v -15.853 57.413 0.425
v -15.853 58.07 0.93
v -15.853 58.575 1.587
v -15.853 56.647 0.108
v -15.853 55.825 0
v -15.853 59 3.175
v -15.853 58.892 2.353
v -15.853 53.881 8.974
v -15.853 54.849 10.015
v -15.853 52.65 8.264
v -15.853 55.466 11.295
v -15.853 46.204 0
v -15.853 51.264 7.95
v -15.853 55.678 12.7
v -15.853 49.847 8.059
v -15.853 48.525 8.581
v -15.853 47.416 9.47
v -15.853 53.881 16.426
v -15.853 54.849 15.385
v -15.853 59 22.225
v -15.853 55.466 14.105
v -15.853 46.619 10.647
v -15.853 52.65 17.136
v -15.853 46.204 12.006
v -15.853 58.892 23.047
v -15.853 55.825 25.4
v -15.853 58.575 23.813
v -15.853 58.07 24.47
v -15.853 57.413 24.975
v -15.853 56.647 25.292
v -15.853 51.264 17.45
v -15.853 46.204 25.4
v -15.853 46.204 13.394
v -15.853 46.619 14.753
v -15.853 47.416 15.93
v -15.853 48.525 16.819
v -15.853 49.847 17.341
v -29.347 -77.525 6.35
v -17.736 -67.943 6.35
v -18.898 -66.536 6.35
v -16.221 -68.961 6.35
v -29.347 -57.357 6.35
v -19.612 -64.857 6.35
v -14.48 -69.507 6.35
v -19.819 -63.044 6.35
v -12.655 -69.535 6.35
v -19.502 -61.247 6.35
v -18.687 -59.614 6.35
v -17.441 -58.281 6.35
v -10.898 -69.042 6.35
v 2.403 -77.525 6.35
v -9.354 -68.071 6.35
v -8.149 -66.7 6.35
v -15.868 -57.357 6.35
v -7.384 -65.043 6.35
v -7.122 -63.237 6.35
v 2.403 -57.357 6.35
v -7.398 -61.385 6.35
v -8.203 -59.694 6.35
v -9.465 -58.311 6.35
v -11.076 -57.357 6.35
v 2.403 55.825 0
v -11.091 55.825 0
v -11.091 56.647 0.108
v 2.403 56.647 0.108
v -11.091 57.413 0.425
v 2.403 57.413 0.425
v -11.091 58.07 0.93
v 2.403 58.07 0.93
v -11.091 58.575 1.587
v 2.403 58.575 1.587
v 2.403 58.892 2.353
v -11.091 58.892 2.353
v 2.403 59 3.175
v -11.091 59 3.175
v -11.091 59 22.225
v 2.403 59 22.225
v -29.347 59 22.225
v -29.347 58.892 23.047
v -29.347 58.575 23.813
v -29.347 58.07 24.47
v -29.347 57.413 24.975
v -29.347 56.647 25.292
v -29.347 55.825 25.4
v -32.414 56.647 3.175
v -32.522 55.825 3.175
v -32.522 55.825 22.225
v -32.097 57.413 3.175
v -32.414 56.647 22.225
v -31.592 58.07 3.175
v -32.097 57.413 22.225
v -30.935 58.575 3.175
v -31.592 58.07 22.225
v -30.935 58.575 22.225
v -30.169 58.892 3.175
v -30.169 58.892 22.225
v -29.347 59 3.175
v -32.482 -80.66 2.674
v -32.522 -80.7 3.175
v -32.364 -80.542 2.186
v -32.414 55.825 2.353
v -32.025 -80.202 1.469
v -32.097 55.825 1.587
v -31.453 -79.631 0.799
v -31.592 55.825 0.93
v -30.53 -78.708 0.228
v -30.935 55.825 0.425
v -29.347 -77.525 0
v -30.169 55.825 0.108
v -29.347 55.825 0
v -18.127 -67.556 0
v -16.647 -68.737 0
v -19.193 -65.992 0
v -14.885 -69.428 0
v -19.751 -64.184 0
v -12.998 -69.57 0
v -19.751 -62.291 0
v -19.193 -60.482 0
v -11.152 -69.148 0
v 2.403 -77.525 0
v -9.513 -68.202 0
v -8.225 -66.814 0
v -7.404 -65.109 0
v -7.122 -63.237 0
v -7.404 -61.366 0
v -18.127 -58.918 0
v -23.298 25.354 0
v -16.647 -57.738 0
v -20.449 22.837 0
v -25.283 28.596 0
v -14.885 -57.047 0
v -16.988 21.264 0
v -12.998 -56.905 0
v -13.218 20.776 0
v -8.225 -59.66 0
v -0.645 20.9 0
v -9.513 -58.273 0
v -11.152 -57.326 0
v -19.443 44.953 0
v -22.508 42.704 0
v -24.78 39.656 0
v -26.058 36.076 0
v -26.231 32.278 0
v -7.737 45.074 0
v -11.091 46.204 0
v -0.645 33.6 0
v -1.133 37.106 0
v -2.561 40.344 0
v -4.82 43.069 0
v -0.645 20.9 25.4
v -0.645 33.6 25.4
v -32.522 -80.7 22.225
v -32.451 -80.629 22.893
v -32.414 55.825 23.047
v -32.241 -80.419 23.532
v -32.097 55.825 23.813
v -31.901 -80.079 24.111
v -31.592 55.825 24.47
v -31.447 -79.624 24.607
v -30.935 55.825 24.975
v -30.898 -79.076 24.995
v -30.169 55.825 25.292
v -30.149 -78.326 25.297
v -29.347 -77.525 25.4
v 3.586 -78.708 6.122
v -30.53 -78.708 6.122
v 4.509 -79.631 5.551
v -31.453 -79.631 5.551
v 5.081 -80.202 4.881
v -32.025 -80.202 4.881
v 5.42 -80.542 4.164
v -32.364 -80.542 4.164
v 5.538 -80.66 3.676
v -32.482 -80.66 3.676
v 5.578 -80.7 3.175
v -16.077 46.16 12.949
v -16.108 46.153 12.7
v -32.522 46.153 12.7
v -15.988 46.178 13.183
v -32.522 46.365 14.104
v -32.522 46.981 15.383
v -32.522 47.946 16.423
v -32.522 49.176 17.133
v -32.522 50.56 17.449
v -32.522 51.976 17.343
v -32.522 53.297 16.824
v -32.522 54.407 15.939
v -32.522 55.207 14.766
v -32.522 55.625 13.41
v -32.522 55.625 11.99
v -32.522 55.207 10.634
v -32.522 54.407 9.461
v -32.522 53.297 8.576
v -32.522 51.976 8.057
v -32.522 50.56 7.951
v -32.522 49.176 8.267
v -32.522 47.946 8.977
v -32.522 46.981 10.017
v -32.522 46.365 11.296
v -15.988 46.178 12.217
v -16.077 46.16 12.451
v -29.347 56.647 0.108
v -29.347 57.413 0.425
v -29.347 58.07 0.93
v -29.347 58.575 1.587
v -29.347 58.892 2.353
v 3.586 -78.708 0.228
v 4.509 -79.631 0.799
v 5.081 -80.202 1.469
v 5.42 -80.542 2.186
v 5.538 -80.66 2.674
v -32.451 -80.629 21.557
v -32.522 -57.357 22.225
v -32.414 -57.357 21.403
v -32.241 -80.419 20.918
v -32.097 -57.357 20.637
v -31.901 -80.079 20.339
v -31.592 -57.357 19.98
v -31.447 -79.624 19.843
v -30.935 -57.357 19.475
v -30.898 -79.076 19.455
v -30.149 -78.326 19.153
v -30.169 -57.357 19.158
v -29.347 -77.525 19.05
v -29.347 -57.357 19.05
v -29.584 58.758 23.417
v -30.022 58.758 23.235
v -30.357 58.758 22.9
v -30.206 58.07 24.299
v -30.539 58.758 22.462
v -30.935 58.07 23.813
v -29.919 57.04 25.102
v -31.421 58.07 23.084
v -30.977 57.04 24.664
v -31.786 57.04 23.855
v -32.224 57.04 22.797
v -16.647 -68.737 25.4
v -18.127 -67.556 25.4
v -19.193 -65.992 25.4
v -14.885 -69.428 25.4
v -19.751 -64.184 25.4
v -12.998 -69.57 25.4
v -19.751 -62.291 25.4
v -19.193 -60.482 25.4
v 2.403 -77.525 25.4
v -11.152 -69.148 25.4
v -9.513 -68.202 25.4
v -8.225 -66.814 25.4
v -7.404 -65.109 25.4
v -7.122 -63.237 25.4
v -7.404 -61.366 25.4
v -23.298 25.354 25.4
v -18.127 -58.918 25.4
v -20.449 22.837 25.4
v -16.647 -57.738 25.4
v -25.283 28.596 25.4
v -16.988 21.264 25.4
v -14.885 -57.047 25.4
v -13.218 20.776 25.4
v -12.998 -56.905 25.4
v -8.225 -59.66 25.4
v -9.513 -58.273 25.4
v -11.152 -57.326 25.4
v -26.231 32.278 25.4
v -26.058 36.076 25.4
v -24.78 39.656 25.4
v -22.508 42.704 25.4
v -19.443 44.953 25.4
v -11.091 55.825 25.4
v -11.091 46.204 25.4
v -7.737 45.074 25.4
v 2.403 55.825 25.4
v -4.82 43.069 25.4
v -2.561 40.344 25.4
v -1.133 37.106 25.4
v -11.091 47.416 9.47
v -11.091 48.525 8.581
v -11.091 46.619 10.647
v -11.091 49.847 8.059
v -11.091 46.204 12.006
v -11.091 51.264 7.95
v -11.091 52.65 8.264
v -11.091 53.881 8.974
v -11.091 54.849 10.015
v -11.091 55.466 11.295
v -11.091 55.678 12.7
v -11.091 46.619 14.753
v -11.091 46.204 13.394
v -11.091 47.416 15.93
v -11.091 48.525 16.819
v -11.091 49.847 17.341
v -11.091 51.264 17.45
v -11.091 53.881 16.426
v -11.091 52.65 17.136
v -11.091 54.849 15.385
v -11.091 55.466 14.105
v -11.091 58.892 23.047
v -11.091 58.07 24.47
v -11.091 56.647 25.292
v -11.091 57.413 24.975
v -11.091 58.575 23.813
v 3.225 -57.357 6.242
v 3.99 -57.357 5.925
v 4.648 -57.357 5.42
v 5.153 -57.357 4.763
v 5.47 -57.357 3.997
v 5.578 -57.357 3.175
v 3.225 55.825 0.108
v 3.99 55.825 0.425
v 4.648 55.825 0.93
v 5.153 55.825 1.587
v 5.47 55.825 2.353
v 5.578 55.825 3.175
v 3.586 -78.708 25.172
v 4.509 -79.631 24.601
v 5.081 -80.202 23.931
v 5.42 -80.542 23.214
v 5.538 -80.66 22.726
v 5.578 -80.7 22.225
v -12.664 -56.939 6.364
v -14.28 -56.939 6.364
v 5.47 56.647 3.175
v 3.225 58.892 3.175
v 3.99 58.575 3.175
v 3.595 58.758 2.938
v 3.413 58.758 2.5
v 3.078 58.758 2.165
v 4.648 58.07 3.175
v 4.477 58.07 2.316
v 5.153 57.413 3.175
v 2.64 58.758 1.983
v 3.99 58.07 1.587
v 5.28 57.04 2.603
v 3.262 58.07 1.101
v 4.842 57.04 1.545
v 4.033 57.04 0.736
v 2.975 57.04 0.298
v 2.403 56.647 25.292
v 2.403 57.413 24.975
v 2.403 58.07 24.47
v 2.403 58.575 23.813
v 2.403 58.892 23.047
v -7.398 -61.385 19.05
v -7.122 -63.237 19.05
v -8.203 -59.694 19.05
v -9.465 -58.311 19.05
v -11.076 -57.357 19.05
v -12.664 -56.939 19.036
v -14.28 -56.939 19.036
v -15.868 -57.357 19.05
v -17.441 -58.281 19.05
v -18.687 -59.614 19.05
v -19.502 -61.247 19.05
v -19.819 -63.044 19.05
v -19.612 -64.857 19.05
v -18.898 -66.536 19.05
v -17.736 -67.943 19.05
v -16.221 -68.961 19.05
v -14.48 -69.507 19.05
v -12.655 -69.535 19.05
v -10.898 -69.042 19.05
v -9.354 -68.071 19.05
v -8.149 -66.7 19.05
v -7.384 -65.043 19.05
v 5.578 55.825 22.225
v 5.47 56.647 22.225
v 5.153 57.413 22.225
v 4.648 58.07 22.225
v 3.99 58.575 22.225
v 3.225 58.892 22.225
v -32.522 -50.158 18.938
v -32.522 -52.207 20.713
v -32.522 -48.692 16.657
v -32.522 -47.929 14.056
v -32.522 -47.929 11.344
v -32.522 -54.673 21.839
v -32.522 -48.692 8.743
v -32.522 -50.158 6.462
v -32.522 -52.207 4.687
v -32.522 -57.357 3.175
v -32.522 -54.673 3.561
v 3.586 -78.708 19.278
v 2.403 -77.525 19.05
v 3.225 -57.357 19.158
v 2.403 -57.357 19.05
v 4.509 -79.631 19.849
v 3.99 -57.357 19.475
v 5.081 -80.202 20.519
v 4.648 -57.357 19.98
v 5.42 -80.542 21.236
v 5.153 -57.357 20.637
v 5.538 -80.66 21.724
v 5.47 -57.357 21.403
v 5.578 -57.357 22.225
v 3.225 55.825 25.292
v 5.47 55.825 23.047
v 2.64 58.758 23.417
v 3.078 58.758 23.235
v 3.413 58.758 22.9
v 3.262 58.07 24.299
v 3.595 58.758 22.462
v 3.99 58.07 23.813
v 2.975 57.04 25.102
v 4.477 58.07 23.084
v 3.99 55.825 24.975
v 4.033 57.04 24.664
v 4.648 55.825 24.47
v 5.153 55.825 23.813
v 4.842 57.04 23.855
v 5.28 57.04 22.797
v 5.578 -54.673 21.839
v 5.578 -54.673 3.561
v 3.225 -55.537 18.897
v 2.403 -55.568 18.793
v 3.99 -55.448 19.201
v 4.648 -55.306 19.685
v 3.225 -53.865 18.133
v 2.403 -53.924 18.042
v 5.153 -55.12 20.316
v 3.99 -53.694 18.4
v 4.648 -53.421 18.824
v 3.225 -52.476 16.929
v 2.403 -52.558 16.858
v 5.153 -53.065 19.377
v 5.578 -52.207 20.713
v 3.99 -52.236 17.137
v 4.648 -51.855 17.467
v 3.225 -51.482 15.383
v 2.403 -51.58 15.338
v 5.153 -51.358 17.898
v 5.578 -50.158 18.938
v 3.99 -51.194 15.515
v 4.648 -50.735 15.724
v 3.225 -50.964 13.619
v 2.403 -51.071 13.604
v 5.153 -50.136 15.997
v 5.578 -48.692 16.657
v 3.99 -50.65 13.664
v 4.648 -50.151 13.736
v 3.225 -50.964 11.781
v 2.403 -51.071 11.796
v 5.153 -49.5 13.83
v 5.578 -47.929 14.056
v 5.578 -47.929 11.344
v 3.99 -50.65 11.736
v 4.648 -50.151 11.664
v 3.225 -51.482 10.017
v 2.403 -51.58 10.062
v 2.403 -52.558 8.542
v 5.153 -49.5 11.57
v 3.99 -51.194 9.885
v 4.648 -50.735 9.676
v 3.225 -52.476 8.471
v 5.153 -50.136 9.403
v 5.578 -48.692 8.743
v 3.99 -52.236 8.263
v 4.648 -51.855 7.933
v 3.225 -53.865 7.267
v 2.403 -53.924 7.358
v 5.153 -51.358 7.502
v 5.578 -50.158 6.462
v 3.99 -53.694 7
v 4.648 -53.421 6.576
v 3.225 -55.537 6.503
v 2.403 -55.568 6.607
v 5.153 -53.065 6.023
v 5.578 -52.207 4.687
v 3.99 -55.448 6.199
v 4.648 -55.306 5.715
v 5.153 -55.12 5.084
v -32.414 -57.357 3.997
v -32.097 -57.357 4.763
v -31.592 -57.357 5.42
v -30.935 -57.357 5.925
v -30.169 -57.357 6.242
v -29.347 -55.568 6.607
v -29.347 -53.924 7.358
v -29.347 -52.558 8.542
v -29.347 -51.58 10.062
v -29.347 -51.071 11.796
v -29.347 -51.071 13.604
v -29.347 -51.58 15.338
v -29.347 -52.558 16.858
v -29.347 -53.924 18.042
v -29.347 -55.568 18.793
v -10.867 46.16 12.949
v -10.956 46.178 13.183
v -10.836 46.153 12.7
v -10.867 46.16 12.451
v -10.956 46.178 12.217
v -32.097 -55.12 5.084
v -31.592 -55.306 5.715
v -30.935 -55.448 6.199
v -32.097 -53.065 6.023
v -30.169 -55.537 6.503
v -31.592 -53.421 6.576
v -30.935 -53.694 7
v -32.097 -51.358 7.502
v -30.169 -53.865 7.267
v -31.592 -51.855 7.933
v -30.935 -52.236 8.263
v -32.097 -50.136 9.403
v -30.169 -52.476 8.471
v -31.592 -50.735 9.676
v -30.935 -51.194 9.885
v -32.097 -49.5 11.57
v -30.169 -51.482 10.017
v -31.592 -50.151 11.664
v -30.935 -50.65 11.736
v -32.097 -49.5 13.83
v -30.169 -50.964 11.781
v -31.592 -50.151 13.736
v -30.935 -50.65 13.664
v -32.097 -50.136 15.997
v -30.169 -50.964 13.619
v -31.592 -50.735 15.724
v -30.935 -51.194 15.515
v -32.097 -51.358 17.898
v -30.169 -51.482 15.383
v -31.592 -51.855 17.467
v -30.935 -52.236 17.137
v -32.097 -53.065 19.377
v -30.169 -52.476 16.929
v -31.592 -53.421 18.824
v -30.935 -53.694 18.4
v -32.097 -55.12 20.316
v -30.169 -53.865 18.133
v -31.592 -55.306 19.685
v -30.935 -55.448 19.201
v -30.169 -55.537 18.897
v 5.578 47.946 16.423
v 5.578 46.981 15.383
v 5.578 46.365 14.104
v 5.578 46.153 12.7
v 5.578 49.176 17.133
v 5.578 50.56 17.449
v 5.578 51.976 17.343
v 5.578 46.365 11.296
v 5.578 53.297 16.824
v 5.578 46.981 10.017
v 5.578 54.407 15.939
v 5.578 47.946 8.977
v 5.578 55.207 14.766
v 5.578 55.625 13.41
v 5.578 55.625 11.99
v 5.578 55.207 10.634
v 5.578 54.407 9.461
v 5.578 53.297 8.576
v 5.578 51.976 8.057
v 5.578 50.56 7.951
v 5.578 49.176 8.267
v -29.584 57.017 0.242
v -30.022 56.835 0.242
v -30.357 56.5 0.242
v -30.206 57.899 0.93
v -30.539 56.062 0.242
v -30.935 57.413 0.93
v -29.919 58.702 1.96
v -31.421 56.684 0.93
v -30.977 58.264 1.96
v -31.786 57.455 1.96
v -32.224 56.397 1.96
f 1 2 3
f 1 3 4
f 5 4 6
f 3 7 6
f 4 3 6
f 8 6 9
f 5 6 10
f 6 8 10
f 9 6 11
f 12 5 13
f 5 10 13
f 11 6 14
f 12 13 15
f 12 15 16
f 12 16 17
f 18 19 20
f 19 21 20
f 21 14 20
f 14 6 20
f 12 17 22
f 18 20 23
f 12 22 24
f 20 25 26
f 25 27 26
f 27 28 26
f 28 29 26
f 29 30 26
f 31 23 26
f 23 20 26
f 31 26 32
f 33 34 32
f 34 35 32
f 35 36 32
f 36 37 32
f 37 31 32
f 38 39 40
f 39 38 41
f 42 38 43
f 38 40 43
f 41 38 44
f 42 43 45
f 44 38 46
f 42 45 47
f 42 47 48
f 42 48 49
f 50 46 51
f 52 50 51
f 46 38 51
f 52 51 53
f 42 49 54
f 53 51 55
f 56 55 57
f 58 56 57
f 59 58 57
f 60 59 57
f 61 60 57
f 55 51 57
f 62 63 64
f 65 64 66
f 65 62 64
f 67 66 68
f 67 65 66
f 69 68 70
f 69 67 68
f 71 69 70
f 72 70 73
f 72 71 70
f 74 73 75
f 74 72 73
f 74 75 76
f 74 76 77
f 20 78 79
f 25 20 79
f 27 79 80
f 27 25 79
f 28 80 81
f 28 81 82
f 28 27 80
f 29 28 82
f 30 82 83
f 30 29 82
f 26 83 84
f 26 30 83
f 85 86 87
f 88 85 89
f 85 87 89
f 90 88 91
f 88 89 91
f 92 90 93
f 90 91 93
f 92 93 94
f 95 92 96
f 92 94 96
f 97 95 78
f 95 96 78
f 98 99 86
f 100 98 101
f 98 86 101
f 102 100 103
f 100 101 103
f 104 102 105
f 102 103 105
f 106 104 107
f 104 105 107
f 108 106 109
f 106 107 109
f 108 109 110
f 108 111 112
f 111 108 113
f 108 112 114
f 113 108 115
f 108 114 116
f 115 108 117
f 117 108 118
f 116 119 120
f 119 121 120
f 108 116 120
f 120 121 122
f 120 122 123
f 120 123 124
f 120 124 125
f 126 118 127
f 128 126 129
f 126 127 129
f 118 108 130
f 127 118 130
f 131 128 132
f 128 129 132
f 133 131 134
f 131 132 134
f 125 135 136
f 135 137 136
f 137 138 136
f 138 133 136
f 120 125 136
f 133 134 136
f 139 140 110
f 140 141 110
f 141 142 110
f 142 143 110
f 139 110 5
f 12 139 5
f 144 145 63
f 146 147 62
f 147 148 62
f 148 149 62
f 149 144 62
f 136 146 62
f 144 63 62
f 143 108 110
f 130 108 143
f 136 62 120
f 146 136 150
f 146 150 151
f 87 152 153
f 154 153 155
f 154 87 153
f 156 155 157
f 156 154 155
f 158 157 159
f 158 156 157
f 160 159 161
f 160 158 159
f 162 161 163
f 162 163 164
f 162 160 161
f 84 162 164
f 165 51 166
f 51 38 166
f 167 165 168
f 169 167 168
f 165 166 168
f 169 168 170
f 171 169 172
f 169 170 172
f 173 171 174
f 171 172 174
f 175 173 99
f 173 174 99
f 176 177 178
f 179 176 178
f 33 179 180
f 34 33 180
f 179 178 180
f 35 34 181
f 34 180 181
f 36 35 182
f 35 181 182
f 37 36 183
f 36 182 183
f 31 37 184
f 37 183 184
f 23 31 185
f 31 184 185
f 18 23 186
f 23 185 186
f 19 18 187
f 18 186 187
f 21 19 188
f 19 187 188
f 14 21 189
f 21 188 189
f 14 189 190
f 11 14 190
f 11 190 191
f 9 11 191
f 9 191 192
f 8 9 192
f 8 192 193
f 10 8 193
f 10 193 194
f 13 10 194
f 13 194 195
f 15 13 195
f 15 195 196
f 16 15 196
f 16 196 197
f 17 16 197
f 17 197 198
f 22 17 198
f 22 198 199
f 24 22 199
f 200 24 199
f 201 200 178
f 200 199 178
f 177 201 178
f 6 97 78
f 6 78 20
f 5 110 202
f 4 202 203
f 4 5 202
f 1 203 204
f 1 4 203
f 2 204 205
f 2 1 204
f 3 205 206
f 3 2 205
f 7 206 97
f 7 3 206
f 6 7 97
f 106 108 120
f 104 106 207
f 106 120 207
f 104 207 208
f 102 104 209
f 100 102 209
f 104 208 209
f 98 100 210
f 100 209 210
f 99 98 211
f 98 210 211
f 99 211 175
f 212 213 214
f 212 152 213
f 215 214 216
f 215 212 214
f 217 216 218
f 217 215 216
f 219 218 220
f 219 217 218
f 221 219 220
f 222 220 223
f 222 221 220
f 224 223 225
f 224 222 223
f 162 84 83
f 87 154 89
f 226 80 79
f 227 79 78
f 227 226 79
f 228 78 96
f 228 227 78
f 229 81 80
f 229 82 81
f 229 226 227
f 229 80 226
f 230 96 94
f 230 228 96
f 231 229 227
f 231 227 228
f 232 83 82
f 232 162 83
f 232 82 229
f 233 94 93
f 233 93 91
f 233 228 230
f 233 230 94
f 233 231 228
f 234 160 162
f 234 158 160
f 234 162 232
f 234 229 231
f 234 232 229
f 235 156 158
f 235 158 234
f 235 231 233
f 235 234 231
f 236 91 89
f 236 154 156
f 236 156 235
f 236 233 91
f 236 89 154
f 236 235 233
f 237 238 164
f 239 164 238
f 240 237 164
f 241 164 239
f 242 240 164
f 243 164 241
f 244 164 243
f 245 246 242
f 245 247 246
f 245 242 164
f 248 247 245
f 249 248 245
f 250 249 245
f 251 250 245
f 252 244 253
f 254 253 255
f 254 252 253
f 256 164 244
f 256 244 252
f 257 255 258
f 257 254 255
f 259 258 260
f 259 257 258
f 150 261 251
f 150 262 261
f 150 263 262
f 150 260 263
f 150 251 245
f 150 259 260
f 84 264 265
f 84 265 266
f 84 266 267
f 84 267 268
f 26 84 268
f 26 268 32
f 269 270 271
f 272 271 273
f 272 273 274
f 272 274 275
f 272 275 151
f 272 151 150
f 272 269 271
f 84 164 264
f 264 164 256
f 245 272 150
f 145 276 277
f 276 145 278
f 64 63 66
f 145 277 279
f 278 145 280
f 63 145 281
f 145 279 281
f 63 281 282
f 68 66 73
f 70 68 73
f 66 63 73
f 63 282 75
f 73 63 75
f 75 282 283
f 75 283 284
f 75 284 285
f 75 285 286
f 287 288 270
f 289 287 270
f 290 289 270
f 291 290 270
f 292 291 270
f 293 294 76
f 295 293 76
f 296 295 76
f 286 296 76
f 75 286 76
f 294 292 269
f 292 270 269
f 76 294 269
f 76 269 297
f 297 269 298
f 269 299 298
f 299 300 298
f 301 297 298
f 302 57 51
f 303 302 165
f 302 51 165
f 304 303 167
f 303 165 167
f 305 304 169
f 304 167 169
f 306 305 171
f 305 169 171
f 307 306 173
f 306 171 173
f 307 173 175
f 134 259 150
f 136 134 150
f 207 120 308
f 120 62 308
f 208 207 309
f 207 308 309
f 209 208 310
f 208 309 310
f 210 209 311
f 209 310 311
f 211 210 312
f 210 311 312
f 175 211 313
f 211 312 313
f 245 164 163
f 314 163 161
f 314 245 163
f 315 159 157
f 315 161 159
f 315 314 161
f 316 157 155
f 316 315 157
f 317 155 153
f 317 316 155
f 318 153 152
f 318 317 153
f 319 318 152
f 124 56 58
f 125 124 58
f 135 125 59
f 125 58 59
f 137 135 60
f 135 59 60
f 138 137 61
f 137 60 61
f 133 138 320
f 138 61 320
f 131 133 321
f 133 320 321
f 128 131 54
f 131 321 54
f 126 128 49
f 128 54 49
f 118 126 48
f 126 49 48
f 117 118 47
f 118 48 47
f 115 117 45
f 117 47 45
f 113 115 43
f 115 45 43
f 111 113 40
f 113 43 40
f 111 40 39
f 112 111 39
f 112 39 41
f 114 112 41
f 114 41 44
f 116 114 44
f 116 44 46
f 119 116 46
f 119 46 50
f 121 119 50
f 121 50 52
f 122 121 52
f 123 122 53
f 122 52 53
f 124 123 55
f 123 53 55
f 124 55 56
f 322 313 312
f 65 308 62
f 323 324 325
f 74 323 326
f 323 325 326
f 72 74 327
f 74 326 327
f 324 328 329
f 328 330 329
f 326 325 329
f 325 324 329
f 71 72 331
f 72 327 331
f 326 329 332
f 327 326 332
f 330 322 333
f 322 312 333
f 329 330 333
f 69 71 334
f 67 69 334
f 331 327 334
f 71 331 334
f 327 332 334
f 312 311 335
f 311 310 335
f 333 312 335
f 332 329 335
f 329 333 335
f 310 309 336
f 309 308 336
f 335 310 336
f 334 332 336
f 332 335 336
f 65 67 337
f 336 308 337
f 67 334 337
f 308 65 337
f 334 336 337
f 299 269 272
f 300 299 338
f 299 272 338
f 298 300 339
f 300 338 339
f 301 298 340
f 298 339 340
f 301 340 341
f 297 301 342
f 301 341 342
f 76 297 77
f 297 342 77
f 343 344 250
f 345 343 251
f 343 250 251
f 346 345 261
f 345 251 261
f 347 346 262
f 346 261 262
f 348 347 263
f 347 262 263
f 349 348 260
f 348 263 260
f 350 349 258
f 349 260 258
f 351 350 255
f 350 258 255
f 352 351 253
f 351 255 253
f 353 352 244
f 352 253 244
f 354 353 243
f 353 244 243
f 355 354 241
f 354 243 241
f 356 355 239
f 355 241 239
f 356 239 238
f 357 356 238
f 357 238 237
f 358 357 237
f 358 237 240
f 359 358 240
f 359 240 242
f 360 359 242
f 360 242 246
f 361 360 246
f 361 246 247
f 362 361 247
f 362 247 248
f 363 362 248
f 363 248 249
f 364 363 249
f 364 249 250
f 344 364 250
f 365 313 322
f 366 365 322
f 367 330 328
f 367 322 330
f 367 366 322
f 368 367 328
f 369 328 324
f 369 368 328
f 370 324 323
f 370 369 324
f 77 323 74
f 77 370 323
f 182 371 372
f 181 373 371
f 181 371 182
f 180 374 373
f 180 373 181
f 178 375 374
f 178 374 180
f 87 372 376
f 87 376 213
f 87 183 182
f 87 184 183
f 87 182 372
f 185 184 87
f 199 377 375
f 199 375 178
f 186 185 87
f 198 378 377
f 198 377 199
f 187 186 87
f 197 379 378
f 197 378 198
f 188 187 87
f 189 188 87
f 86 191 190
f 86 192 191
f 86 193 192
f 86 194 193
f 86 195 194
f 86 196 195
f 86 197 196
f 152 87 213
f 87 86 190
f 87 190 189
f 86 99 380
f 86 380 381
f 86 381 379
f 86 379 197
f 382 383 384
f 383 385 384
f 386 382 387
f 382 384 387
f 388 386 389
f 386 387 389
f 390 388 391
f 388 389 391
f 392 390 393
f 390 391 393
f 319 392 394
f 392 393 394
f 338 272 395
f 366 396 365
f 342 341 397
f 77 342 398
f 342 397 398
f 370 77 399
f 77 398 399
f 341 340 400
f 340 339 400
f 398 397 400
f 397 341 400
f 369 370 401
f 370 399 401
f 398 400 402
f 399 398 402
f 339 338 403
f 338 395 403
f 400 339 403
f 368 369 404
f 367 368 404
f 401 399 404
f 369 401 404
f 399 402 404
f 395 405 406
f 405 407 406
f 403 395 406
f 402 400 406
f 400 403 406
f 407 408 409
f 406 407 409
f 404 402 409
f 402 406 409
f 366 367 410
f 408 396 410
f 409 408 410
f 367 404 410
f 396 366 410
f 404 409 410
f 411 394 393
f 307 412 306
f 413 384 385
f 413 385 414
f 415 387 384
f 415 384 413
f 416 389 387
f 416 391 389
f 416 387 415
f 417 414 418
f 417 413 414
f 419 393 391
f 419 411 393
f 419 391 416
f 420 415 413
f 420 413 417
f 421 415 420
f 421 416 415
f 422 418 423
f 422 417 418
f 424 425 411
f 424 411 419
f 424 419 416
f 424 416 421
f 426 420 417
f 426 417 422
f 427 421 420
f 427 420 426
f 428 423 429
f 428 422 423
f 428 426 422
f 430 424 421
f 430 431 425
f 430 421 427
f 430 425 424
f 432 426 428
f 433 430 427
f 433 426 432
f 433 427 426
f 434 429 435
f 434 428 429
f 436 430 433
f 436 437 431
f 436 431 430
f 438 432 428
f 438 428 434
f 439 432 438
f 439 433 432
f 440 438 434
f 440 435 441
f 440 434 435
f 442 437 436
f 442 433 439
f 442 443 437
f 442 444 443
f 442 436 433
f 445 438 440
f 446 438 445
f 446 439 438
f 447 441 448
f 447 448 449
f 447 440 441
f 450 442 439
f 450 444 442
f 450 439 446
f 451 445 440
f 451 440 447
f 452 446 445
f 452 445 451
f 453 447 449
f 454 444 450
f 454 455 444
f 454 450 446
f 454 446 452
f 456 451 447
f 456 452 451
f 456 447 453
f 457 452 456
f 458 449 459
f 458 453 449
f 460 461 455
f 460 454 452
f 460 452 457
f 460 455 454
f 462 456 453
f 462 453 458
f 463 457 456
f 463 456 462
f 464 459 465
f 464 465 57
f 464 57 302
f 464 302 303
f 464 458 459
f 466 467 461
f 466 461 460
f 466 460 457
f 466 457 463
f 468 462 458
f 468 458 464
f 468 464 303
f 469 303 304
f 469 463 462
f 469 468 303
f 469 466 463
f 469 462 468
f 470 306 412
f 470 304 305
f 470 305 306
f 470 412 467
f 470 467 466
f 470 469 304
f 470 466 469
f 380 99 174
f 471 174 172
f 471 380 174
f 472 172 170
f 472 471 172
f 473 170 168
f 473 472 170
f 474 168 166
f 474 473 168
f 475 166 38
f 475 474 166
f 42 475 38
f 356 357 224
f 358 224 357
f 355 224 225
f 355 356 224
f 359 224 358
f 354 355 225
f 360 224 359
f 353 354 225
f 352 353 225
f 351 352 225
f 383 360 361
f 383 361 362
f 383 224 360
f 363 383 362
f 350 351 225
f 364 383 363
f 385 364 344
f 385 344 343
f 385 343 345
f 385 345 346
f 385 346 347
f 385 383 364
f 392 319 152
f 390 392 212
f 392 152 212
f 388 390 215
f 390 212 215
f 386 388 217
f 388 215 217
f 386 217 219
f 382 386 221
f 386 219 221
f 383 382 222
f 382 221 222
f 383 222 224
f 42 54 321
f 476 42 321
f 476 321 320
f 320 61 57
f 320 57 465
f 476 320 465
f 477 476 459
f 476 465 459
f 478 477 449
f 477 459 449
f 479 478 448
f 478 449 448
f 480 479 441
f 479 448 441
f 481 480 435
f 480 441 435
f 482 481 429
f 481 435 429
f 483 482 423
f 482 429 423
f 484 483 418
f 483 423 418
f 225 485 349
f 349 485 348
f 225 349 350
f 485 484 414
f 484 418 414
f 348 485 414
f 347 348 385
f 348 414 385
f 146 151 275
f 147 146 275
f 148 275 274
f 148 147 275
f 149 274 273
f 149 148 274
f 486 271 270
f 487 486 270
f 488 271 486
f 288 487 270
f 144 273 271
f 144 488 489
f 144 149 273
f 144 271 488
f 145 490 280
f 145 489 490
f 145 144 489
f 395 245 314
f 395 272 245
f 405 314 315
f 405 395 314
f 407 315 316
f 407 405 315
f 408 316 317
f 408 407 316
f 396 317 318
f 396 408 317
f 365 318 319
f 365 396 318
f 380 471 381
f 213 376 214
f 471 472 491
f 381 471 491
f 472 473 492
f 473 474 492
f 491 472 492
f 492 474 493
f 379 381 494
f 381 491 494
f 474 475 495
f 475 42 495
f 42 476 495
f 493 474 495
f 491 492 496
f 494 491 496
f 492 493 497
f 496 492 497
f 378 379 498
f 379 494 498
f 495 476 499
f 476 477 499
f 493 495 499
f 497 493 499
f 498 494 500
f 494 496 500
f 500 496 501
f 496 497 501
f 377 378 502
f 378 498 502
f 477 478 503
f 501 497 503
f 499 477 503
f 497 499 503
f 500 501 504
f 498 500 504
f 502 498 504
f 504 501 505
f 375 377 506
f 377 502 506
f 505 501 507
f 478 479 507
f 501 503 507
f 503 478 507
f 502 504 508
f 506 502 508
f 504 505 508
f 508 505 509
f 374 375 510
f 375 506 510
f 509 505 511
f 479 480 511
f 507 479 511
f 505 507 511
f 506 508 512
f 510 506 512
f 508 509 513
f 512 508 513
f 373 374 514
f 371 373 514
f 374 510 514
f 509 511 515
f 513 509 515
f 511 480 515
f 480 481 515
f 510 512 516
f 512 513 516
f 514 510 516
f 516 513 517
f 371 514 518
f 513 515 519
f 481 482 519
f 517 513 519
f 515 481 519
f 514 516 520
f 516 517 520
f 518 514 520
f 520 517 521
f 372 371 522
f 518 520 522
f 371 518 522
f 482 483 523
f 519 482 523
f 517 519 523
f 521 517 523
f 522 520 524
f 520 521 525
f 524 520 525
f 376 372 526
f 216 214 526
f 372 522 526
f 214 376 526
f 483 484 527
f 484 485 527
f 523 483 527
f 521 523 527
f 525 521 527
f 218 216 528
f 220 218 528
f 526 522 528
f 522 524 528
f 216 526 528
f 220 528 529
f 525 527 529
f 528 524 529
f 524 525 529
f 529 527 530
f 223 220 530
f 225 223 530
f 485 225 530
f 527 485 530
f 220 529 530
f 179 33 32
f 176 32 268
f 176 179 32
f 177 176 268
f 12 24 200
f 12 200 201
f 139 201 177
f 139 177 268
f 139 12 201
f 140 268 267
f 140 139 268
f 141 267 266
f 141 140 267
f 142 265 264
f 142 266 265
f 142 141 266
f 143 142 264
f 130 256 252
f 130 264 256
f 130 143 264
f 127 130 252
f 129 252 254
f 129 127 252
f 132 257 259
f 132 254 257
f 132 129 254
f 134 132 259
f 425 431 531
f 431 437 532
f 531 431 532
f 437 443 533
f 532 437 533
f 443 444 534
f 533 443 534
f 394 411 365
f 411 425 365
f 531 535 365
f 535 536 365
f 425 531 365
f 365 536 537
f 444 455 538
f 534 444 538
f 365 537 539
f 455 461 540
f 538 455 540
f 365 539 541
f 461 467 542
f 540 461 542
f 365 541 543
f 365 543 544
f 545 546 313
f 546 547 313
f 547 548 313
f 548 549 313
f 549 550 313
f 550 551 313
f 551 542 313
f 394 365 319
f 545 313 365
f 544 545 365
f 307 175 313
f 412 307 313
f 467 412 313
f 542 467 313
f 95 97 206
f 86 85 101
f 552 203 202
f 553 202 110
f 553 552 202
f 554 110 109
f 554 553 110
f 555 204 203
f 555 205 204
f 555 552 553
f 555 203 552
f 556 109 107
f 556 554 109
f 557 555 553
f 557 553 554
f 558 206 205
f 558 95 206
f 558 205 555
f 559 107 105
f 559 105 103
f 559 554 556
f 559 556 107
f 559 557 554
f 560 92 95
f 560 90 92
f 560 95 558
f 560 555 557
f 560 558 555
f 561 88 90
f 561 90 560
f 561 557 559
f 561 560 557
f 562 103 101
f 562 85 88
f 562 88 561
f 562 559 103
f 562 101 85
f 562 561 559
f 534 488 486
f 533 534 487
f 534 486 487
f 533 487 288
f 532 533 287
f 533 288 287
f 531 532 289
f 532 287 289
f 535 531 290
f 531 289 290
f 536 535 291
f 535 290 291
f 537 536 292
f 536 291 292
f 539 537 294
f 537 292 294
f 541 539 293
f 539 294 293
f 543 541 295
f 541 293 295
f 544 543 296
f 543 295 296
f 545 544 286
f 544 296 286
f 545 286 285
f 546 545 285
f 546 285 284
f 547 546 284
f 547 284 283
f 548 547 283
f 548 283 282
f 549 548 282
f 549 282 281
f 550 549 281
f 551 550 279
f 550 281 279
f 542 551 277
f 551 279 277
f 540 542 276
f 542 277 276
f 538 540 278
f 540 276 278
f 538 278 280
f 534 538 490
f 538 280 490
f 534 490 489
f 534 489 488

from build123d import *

# Parameters (mm, degrees)
F0_W      = 38.1
F0_H      = 139.7
F0_R      = 12.827
F1_DEPTH  = 25.4
F3_DEPTH  = 25.4
F4_R      = 4.7625
F5_DEPTH  = 127
F6_R      = 6.35
F7_DEPTH  = 50.8
F8_W      = 23.3431950331
F8_H      = 12.7
F9_DEPTH  = 76.2
F10_R     = 3.17499
F12_DEPTH = 25.4


# Not quite as in the source:
# - a fillet or chamfer is up to 0.001 mm smaller than in the source, because OpenCascade refuses the exact size


with BuildPart() as f1:
    # F0 (on Top) → F1 (new body)
    with BuildSketch(Plane.XY):
        with Locations((-13.4720488012, -10.8498208284)):
            Rectangle(F0_W, F0_H)
        with Locations((-13.4720488012, 33.6001791716)):
            Circle(F0_R, mode=Mode.SUBTRACT)
    extrude(amount=F1_DEPTH)

    # F2 (on face) → F3 (cut)
    with BuildSketch(Plane.XY.offset(25.4)):
        with BuildLine():
            Line((-11.0907988012, 46.2042093777), (-11.0907988012, 59.0001791716))
            Line((-11.0907988012, 59.0001791716), (-15.8532988012, 59.0001791716))
            Line((-15.8532988012, 59.0001791716), (-15.8532988012, 46.2042093777))
            ThreePointArc((-15.8532988012, 46.2042093777), (-13.4720488012, 46.4271791716), (-11.0907988012, 46.2042093777))
        make_face()
    extrude(amount=-F3_DEPTH, mode=Mode.SUBTRACT)

    # F4 (on face) → F5 (cut)
    with BuildSketch(Plane(origin=(-32.5220488012, 0, 0), x_dir=(0, -1, 0), z_dir=(-1, 0, 0))):
        with Locations((-50.9158676147, 12.7)):
            Circle(F4_R)
    extrude(amount=-F5_DEPTH, mode=Mode.SUBTRACT)

    # F6 (on face) → F7 (cut)
    with BuildSketch(Plane.XY.offset(25.4)):
        with Locations((-13.4720488012, -63.2373208284)):
            Circle(F6_R)
    extrude(amount=-F7_DEPTH, mode=Mode.SUBTRACT)

    # F8 (on face) → F9 (cut)
    with BuildSketch(Plane.YZ.offset(5.5779511988)):
        with Locations((-69.0282233119, 12.7)):
            Rectangle(F8_W, F8_H)
        with BuildLine():
            Line((-57.3566257954, 19.05), (-57.3566257954, 6.35))
            ThreePointArc((-57.3566257954, 6.35), (-51.0066257954, 12.7), (-57.3566257954, 19.05))
        make_face()
    extrude(amount=-F9_DEPTH, mode=Mode.SUBTRACT)

    # F10 (radius 3.175 in the source; OpenCascade refuses exactly that, so slightly less here)
    f10_edges = [f1.edges().sort_by_distance(p)[0] for p in [
        (5.577951, -69.028223, 19.05),
        (-13.472049, -80.699821, 6.35),
        (5.577951, -10.849821, 25.4),
        (-32.522049, -10.849821, 25.4),
        (-13.472049, -80.699821, 25.4),
        (5.577951, -10.849821, 0),
        (-13.472049, -80.699821, 0),
        (-24.187674, 59.000179, 25.4),
        (-2.756424, 59.000179, 25.4),
        (-32.522049, 59.000179, 12.7),
        (5.577951, 59.000179, 12.7),
        (-2.756424, 59.000179, 0),
        (-24.187674, 59.000179, 0),
        (-32.522049, -10.849821, 0),
        (-13.472049, -80.699821, 19.05),
        (-32.522049, -51.006626, 12.7),
        (-32.522049, -69.028223, 6.35),
        (-32.522049, -69.028223, 19.05),
    ]]
    fillet(f10_edges, radius=F10_R)

    # F11 (on face) → F12 (cut)
    with BuildSketch(Plane.XY.offset(25.4)):
        with BuildLine():
            Line((-0.6450488012, 20.9001791716), (-0.6450488012, 33.6001791716))
            ThreePointArc((-0.6450488012, 33.6001791716), (-4.3126364935, 24.6203631836), (-13.2180736983, 20.7756937765))
            Line((-13.2180736983, 20.7756937765), (-0.6450488012, 20.9001791716))
        make_face()
    extrude(amount=-F12_DEPTH, mode=Mode.SUBTRACT)


solid = f1.part
